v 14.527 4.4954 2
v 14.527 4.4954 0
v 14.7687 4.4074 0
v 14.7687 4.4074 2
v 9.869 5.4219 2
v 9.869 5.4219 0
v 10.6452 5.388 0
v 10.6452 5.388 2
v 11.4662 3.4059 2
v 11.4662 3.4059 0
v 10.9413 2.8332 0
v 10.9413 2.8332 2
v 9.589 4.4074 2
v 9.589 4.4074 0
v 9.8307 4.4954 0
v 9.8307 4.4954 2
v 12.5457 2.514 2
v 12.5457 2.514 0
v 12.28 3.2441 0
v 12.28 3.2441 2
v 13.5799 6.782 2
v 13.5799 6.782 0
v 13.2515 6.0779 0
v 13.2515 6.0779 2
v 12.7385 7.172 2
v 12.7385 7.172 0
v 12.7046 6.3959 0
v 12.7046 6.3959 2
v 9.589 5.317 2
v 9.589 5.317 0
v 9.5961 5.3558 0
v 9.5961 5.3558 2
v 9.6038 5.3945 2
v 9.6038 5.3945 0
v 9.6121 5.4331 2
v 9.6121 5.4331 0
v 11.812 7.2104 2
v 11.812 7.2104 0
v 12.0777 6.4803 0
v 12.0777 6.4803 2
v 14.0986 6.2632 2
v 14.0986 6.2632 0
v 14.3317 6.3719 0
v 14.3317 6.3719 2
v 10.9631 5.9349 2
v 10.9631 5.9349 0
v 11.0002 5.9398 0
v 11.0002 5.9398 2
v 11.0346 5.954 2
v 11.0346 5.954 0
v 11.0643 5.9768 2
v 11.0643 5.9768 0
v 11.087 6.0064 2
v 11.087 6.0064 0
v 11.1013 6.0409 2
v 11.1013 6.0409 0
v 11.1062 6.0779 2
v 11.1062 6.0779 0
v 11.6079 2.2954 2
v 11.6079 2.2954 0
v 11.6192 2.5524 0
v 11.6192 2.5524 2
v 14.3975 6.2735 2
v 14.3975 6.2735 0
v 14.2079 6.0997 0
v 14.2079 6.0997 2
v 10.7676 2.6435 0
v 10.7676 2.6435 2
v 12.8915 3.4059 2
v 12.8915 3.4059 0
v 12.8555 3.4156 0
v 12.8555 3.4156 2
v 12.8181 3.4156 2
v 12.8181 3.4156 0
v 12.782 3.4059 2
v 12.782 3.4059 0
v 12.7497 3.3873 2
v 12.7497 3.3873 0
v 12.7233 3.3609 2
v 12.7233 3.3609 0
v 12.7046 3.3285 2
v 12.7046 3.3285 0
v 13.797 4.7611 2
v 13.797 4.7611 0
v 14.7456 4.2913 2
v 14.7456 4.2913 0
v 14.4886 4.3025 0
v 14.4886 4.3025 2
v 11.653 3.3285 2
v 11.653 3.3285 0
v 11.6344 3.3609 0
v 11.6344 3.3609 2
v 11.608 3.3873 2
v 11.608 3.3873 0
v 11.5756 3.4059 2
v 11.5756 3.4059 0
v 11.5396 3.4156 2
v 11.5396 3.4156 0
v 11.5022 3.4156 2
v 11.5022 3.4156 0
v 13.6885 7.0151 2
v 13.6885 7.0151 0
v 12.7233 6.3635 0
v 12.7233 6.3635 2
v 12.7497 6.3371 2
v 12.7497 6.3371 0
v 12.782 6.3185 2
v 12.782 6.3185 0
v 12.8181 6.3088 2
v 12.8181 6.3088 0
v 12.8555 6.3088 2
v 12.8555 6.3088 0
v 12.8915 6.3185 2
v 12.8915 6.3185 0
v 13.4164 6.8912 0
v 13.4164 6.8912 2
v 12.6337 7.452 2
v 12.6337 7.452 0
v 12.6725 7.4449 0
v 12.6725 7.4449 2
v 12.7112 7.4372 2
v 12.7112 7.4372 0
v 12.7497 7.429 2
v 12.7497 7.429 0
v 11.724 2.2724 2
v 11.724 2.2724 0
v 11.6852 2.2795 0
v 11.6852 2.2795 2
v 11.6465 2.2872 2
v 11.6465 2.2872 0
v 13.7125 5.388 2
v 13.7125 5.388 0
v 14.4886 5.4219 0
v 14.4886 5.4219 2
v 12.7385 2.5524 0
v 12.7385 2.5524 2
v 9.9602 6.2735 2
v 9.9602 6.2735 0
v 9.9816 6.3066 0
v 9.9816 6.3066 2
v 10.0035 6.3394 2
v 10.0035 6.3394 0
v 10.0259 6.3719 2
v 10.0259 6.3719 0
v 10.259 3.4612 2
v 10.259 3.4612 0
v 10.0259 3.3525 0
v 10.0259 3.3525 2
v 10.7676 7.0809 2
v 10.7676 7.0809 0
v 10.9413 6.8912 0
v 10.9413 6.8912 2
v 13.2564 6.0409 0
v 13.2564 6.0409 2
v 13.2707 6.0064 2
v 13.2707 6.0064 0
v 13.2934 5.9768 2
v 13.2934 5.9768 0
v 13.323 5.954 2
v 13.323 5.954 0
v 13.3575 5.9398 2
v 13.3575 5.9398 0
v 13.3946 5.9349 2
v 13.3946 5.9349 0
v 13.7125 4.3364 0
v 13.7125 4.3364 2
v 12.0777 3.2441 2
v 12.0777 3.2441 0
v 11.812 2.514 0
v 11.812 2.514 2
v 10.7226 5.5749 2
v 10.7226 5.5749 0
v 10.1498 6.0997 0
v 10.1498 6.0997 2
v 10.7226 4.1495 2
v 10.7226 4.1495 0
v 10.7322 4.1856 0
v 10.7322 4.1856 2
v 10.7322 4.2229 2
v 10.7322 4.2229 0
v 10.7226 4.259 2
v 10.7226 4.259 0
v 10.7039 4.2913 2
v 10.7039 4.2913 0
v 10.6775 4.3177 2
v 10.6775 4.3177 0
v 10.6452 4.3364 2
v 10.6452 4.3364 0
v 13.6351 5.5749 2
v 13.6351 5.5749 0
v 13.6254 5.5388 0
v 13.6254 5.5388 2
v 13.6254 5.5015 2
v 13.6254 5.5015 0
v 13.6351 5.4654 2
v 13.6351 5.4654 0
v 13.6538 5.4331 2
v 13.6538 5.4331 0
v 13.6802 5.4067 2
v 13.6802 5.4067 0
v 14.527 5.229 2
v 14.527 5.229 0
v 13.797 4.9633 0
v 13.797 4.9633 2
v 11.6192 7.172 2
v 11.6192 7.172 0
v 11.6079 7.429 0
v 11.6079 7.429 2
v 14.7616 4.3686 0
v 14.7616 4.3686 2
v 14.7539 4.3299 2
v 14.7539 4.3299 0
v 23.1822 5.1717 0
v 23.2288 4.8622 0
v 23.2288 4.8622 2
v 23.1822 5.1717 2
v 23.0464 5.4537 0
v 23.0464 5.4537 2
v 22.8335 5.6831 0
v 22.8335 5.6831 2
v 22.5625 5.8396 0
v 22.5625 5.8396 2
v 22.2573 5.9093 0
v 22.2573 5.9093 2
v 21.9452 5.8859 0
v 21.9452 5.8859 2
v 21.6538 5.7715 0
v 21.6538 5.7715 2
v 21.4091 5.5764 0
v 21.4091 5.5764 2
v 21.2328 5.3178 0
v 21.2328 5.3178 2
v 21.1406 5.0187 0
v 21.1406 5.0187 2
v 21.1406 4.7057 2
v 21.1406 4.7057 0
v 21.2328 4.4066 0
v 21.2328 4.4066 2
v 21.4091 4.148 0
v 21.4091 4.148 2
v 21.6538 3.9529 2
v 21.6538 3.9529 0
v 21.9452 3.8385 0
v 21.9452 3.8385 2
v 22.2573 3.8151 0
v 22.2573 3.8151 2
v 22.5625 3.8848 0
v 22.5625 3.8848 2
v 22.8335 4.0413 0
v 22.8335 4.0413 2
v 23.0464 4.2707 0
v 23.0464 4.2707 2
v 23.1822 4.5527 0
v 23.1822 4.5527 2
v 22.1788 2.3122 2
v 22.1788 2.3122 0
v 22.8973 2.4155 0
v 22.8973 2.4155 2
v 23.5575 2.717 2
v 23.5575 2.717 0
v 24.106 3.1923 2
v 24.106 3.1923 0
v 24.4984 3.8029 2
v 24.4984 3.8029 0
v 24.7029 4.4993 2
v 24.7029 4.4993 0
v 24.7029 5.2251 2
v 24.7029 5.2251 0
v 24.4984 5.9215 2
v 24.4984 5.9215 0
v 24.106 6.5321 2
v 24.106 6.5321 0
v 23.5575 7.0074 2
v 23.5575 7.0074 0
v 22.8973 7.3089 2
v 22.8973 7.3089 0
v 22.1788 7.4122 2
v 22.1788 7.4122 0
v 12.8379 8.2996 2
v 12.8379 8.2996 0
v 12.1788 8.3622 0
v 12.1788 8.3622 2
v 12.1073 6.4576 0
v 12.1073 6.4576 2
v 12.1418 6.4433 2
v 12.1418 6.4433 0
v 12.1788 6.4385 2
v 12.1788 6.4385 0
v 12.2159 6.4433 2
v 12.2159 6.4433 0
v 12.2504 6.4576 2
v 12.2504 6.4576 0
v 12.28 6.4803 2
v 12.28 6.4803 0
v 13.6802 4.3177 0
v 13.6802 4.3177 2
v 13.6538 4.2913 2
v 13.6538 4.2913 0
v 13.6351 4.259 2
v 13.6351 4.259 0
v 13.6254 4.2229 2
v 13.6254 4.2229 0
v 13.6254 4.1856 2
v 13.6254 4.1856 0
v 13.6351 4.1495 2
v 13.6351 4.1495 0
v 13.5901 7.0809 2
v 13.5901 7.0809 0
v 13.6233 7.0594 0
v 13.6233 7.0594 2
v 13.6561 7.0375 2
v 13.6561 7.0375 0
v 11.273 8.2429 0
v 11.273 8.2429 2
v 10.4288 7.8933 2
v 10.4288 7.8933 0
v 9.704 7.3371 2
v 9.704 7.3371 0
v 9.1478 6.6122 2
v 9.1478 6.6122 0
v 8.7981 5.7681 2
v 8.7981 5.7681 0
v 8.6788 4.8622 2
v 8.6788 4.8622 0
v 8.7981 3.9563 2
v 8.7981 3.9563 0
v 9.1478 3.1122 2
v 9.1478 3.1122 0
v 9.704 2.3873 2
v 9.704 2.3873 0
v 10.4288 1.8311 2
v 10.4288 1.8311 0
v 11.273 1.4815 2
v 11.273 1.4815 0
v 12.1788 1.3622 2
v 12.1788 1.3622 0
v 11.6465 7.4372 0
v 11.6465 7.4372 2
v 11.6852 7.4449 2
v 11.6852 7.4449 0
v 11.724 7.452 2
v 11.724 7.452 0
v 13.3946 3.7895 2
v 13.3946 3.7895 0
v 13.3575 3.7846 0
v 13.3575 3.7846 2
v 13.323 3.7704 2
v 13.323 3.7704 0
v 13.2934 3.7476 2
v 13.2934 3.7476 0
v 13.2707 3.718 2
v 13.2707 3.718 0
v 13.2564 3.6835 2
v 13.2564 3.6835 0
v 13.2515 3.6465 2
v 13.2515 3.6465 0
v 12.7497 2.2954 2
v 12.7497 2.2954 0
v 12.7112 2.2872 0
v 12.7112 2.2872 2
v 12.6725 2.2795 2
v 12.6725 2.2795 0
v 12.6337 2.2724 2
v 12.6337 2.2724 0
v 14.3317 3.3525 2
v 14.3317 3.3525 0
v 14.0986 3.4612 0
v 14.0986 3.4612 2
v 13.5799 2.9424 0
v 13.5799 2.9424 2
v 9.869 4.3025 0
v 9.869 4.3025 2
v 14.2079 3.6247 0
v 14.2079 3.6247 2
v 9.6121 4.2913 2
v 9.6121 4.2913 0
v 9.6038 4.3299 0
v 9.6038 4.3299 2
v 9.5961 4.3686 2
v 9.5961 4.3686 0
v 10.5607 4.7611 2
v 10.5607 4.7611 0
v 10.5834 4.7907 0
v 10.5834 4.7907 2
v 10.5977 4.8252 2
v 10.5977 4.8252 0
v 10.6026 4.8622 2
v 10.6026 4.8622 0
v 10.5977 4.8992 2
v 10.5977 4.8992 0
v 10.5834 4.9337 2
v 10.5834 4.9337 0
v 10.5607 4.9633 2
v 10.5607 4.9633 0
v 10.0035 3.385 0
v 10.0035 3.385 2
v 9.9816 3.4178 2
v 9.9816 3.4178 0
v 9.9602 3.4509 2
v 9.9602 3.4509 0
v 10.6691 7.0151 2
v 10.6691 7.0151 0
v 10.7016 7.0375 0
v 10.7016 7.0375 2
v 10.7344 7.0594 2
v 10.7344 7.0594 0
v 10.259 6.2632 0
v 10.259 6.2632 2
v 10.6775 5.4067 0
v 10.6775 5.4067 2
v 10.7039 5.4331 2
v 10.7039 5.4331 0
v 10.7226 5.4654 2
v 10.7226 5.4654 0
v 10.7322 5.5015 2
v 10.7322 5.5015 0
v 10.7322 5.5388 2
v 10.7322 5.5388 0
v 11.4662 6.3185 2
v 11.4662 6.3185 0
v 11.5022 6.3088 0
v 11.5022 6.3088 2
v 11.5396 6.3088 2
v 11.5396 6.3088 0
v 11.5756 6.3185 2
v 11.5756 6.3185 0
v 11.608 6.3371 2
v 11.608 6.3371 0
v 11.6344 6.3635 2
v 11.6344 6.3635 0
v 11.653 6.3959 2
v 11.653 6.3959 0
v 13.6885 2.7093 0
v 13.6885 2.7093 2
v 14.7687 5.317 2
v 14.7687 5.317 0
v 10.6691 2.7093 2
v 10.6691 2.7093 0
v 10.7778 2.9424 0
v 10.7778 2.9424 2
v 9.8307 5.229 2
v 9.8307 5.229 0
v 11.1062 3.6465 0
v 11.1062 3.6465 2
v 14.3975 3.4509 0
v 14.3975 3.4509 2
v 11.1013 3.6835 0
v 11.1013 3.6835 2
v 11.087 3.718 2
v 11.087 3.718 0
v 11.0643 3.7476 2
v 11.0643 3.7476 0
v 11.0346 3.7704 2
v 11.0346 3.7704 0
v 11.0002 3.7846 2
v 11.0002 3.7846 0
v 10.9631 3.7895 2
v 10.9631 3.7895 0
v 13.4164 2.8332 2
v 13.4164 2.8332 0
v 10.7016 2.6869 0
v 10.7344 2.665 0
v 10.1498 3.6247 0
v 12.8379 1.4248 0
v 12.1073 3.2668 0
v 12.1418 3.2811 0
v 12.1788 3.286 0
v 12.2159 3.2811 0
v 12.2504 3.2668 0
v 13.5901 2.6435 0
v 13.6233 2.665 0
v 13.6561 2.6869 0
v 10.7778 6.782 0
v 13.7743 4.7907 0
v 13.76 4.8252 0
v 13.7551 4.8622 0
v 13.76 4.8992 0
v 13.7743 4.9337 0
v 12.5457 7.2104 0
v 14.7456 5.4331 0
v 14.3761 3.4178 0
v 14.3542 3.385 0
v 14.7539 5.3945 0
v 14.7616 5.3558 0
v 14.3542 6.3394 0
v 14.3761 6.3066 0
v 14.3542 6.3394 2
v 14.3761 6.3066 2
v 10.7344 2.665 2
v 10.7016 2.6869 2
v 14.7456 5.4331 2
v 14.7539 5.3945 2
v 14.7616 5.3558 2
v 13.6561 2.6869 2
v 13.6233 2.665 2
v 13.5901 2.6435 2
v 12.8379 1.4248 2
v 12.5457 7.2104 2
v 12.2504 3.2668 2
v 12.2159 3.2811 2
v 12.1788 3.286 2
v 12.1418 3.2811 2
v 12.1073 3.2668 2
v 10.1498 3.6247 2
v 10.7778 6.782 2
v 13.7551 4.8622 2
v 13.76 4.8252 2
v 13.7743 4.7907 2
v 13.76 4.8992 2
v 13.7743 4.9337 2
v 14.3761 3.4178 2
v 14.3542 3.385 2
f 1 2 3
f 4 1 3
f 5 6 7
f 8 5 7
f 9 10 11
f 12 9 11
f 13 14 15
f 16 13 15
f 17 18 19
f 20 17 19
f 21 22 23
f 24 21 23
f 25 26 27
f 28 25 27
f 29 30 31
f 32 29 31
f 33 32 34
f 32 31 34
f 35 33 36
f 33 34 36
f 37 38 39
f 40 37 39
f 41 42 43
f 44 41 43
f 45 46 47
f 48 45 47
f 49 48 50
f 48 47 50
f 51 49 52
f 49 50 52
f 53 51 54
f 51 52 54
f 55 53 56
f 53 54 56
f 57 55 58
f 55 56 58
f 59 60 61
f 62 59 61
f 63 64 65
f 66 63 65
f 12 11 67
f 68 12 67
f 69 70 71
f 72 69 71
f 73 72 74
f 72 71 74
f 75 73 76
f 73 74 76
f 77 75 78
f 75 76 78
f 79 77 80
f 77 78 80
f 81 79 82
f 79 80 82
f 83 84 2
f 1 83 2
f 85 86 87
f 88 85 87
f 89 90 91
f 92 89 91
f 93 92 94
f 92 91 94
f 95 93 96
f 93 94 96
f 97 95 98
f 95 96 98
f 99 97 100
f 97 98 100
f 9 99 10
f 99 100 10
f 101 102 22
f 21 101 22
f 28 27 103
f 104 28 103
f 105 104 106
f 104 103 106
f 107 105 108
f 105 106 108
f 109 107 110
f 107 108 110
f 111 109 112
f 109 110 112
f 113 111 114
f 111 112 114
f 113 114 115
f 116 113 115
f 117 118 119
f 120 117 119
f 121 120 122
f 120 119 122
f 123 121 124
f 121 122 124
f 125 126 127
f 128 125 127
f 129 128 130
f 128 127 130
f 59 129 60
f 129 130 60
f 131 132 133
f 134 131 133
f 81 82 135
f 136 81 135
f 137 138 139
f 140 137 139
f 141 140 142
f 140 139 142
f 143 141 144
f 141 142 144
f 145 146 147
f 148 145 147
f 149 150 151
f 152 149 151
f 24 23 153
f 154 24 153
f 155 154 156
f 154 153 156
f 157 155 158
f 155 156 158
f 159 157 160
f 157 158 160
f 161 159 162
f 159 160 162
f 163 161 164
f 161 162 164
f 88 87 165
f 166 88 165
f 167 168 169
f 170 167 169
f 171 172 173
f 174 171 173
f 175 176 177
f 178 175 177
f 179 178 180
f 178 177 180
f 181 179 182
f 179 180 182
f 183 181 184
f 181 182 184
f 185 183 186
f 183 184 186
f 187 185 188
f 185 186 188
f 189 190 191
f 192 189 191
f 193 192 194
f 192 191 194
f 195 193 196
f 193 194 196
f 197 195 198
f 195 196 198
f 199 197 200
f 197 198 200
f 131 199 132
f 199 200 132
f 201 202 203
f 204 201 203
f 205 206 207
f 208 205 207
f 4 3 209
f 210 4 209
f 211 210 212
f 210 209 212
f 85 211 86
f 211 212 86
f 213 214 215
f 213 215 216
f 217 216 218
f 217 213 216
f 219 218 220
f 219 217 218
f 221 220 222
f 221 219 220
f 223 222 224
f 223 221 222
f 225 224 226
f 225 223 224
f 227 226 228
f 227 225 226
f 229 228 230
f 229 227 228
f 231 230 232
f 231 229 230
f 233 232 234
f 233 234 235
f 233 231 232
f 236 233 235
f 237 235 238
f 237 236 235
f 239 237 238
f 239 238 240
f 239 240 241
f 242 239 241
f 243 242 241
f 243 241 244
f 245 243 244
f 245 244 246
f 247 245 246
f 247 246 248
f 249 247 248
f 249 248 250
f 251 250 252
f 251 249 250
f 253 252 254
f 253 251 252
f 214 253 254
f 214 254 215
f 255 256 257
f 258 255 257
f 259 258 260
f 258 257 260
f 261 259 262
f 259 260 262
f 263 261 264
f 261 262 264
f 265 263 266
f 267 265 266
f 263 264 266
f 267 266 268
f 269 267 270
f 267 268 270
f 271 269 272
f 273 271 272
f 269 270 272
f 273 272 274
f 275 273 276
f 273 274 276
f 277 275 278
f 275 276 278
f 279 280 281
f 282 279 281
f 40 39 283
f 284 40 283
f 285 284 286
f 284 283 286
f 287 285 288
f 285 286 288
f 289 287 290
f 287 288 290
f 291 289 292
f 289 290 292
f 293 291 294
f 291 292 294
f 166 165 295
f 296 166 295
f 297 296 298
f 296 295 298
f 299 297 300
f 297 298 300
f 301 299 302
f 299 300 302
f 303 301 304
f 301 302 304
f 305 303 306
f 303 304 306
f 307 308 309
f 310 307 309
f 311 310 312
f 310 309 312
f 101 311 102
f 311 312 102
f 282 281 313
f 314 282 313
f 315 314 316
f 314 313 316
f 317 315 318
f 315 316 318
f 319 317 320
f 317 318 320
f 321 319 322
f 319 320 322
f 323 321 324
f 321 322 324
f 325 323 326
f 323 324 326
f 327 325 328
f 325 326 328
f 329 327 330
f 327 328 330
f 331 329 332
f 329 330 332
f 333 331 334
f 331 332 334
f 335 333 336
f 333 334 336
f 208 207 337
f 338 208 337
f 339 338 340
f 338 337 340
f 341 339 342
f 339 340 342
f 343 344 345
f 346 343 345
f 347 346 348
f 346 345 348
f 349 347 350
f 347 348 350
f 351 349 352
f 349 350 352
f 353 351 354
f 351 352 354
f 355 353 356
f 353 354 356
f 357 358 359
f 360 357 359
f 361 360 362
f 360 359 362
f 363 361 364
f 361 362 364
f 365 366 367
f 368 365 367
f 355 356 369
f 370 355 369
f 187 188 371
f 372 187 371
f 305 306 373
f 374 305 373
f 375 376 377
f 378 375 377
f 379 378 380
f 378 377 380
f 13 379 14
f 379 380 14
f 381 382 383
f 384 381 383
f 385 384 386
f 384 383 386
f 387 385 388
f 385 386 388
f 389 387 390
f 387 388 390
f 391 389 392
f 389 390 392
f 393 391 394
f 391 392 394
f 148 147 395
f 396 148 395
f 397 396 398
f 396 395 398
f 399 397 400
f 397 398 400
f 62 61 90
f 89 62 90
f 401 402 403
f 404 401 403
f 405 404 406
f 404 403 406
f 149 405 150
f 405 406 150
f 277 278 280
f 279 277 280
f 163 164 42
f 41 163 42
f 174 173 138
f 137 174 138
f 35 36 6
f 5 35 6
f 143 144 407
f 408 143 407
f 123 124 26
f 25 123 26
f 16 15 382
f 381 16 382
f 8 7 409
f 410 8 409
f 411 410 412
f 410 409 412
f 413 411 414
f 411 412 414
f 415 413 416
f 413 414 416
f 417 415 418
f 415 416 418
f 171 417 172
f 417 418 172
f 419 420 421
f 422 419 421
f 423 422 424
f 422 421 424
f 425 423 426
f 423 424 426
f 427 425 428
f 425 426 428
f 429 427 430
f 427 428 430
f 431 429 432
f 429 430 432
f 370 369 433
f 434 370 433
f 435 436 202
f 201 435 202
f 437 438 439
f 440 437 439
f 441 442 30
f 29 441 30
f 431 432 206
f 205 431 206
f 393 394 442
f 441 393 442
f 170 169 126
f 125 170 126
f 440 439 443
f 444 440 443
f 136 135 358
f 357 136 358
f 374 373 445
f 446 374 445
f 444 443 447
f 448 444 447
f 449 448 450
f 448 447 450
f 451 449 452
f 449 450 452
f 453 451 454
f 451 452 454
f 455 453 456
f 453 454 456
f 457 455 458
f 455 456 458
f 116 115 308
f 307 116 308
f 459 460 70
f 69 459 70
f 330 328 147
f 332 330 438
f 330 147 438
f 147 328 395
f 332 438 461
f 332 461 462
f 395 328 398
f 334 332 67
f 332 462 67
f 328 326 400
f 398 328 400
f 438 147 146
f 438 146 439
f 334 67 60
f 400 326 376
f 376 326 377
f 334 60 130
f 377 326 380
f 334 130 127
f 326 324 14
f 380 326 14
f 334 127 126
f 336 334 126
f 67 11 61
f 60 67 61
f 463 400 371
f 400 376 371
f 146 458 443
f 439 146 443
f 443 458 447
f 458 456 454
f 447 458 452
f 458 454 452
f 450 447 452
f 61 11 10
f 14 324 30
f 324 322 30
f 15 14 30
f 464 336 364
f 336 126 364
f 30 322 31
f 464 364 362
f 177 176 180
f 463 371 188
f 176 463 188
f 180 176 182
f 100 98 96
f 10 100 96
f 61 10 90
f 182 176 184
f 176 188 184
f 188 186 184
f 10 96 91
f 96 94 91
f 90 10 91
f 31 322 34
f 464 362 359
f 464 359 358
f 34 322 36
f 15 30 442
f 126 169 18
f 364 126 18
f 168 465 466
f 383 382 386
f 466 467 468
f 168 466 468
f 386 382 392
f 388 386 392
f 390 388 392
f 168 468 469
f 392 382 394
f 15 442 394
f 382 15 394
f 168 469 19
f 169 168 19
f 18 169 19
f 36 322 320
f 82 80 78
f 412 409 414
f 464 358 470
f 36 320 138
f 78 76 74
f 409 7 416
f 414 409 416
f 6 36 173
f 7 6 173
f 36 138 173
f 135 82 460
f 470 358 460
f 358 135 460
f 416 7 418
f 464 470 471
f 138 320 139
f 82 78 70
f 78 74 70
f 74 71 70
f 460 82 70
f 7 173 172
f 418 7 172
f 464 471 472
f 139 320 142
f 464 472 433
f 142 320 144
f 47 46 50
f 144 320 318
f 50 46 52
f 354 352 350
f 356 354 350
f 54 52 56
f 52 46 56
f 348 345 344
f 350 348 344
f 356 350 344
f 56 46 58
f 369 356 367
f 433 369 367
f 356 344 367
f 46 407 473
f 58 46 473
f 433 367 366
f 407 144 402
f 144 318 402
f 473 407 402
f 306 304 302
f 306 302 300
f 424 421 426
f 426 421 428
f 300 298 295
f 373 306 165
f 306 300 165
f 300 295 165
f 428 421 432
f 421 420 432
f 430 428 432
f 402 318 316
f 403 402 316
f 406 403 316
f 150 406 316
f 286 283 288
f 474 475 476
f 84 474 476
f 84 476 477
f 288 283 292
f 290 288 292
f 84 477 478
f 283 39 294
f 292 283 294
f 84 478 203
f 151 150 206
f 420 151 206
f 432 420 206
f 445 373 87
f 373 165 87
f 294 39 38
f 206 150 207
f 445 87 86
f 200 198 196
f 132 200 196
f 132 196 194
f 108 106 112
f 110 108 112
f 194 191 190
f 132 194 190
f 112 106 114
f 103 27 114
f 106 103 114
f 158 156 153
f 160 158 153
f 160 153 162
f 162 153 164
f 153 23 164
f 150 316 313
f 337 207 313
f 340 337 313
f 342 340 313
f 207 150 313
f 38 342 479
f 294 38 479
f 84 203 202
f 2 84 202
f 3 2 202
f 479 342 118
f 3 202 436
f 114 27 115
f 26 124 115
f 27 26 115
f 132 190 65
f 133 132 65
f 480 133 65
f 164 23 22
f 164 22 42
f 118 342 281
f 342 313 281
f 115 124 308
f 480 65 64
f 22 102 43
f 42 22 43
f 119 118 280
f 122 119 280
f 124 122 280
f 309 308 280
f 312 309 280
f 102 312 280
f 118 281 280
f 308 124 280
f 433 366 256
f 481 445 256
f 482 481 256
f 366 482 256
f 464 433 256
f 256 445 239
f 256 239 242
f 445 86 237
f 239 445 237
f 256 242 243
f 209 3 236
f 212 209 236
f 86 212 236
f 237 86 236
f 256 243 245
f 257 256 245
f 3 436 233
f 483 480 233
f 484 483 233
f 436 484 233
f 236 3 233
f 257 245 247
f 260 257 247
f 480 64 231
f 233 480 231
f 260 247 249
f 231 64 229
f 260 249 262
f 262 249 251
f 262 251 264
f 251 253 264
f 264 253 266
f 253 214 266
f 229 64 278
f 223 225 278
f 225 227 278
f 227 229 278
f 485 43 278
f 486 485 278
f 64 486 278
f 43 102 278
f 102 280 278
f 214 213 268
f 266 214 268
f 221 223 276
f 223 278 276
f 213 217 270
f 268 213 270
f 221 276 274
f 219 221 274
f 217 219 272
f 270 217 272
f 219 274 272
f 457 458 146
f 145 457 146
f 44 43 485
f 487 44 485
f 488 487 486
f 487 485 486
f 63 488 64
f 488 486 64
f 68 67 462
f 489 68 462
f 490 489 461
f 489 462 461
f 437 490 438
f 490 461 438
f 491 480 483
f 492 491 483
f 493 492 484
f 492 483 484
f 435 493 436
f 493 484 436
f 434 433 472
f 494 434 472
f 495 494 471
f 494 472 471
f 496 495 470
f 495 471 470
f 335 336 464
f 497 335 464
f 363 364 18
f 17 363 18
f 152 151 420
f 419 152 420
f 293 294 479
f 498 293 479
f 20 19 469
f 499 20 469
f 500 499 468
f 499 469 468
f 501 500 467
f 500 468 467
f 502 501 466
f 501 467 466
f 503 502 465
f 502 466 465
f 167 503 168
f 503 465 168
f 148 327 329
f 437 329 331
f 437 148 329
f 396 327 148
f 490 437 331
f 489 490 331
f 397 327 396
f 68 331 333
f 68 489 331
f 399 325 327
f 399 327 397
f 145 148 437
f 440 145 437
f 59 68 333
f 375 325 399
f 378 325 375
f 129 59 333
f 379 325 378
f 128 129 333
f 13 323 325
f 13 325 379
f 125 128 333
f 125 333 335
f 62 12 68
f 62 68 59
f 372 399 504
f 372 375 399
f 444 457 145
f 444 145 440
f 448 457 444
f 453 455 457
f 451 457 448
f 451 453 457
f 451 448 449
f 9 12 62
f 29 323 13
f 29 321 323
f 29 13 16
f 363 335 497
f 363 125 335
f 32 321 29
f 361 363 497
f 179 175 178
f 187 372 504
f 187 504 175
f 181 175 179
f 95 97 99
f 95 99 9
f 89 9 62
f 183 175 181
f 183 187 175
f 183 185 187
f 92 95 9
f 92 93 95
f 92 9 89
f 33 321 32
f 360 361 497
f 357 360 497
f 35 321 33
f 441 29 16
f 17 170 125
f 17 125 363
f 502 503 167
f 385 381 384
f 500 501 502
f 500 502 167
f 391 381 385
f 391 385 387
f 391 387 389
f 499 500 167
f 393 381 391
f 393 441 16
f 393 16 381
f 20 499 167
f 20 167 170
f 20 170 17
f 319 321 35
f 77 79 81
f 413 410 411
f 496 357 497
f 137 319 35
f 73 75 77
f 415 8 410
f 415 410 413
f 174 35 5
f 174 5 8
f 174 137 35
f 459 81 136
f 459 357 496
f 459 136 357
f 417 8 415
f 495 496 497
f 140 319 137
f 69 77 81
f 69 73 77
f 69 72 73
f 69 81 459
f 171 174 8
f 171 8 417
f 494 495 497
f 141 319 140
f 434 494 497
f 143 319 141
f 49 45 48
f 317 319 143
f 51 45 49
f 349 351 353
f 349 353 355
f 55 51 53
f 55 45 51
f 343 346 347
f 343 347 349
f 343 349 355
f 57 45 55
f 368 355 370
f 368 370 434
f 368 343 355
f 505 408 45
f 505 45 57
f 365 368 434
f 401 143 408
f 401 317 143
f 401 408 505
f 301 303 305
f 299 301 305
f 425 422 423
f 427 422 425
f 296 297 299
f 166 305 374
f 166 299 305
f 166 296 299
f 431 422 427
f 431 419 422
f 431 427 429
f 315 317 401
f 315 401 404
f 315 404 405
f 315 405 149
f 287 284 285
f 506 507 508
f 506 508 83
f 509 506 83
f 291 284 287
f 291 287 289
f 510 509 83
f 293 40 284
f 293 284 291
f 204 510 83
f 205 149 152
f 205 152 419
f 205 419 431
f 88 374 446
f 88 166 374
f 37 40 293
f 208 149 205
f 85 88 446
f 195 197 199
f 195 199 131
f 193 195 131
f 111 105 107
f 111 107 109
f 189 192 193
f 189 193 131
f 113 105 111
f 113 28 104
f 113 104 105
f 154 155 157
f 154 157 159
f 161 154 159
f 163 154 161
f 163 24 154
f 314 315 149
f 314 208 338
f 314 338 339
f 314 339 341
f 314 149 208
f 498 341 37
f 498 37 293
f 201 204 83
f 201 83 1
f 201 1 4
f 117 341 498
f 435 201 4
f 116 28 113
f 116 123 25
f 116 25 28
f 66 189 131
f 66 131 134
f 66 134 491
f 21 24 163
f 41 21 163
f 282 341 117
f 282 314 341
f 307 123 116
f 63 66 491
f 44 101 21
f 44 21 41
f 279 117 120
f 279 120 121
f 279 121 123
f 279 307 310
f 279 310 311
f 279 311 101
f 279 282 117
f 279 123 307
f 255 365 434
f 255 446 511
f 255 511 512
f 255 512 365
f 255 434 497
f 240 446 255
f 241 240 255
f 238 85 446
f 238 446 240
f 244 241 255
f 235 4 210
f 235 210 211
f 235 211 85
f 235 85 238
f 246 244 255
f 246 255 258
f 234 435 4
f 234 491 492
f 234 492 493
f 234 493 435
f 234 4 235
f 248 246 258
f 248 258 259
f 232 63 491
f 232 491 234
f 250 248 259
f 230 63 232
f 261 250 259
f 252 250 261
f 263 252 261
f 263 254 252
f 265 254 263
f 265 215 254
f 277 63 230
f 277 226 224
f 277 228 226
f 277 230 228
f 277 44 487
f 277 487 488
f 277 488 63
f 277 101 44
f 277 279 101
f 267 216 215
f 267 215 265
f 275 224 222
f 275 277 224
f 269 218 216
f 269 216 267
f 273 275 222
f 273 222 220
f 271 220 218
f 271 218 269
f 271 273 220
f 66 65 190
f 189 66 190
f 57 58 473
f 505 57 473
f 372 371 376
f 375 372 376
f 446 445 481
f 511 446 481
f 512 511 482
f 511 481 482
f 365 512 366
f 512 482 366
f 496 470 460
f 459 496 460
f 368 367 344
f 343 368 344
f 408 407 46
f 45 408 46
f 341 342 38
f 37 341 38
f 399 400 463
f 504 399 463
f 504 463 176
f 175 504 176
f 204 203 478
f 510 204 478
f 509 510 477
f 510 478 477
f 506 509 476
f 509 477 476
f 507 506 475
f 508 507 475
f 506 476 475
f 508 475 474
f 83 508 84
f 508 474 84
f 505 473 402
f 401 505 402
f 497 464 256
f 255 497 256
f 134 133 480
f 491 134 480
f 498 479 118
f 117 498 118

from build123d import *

# Parameters (mm, degrees)
SKETCH1_R           = 1.05
BOSS_EXTRUDE3_DEPTH = 2


with BuildPart() as part:
    # Sketch1 → Boss-Extrude3 (new body)
    with BuildSketch(Plane.XY):
        with BuildLine():
            Line((12.837896157, 8.299592267), (12.178844101, 8.362202212))
            ThreePointArc((12.178844101, 8.362202212), (8.678844101, 4.862202212), (12.178844101, 1.362202212))
            Line((12.178844101, 1.362202212), (12.837896157, 1.424812158))
            Line((12.837896157, 1.424812158), (22.178844101, 2.312202212))
            ThreePointArc((22.178844101, 2.312202212), (24.728844101, 4.862202212), (22.178844101, 7.412202212))
            Line((22.178844101, 7.412202212), (12.837896157, 8.299592267))
        make_face()
        with BuildLine():
            Line((11.619157127, 2.552399344), (11.653043843, 3.328532726))
            ThreePointArc((11.653043843, 3.328532726), (11.575639379, 3.40593719), (11.466172936, 3.40593719))
            Line((11.466172936, 3.40593719), (10.941325284, 2.833166486))
            Line((10.941325284, 2.833166486), (10.767566215, 2.643541736))
            ThreePointArc((10.767566215, 2.643541736), (10.717983865, 2.675870364), (10.669141763, 2.709306852))
            Line((10.669141763, 2.709306852), (10.777837472, 2.94240555))
            Line((10.777837472, 2.94240555), (11.106158101, 3.646491412))
            ThreePointArc((11.106158101, 3.646491412), (11.064267107, 3.747625218), (10.963133301, 3.789516212))
            Line((10.963133301, 3.789516212), (10.259047439, 3.461195582))
            Line((10.259047439, 3.461195582), (10.025948741, 3.352499874))
            ThreePointArc((10.025948741, 3.352499874), (9.992512253, 3.401341976), (9.960183625, 3.450924326))
            Line((9.960183625, 3.450924326), (10.149808375, 3.624683395))
            Line((10.149808375, 3.624683395), (10.722579079, 4.149531047))
            ThreePointArc((10.722579079, 4.149531047), (10.722579079, 4.258997489), (10.645174615, 4.336401953))
            Line((10.645174615, 4.336401953), (9.869041233, 4.302515238))
            Line((9.869041233, 4.302515238), (9.61209007, 4.291296508))
            ThreePointArc((9.61209007, 4.291296508), (9.599889846, 4.349216316), (9.588996432, 4.407396064))
            Line((9.588996432, 4.407396064), (9.830681575, 4.495362262))
            Line((9.830681575, 4.495362262), (10.560703205, 4.761068406))
            ThreePointArc((10.560703205, 4.761068406), (10.602594199, 4.862202212), (10.560703205, 4.963336018))
            Line((10.560703205, 4.963336018), (9.830681575, 5.229042162))
            Line((9.830681575, 5.229042162), (9.588996432, 5.31700836))
            ThreePointArc((9.588996432, 5.31700836), (9.599889846, 5.375188109), (9.61209007, 5.433107916))
            Line((9.61209007, 5.433107916), (9.869041233, 5.421889186))
            Line((9.869041233, 5.421889186), (10.645174615, 5.388002471))
            ThreePointArc((10.645174615, 5.388002471), (10.722579079, 5.465406935), (10.722579079, 5.574873378))
            Line((10.722579079, 5.574873378), (10.149808375, 6.099721029))
            Line((10.149808375, 6.099721029), (9.960183625, 6.273480099))
            ThreePointArc((9.960183625, 6.273480099), (9.992512253, 6.323062449), (10.025948741, 6.37190455))
            Line((10.025948741, 6.37190455), (10.259047439, 6.263208842))
            Line((10.259047439, 6.263208842), (10.963133301, 5.934888213))
            ThreePointArc((10.963133301, 5.934888213), (11.064267107, 5.976779207), (11.106158101, 6.077913013))
            Line((11.106158101, 6.077913013), (10.777837472, 6.781998874))
            Line((10.777837472, 6.781998874), (10.669141763, 7.015097573))
            ThreePointArc((10.669141763, 7.015097573), (10.717983865, 7.048534061), (10.767566215, 7.080862689))
            Line((10.767566215, 7.080862689), (10.941325284, 6.891237939))
            Line((10.941325284, 6.891237939), (11.466172936, 6.318467235))
            ThreePointArc((11.466172936, 6.318467235), (11.575639379, 6.318467235), (11.653043843, 6.395871699))
            Line((11.653043843, 6.395871699), (11.619157127, 7.172005081))
            Line((11.619157127, 7.172005081), (11.607938397, 7.428956244))
            ThreePointArc((11.607938397, 7.428956244), (11.665858205, 7.441156468), (11.724037954, 7.452049882))
            Line((11.724037954, 7.452049882), (11.812004151, 7.210364739))
            Line((11.812004151, 7.210364739), (12.077710295, 6.480343109))
            ThreePointArc((12.077710295, 6.480343109), (12.178844101, 6.438452114), (12.279977907, 6.480343109))
            Line((12.279977907, 6.480343109), (12.545684051, 7.210364739))
            Line((12.545684051, 7.210364739), (12.633650249, 7.452049882))
            ThreePointArc((12.633650249, 7.452049882), (12.691829998, 7.441156468), (12.749749805, 7.428956244))
            Line((12.749749805, 7.428956244), (12.738531075, 7.172005081))
            Line((12.738531075, 7.172005081), (12.70464436, 6.395871699))
            ThreePointArc((12.70464436, 6.395871699), (12.782048824, 6.318467235), (12.891515267, 6.318467235))
            Line((12.891515267, 6.318467235), (13.416362918, 6.891237939))
            Line((13.416362918, 6.891237939), (13.590121988, 7.080862689))
            ThreePointArc((13.590121988, 7.080862689), (13.639704338, 7.048534061), (13.688546439, 7.015097573))
            Line((13.688546439, 7.015097573), (13.579850731, 6.781998874))
            Line((13.579850731, 6.781998874), (13.251530102, 6.077913013))
            ThreePointArc((13.251530102, 6.077913013), (13.293421096, 5.976779207), (13.394554902, 5.934888213))
            Line((13.394554902, 5.934888213), (14.098640763, 6.263208842))
            Line((14.098640763, 6.263208842), (14.331739462, 6.37190455))
            ThreePointArc((14.331739462, 6.37190455), (14.36517595, 6.323062449), (14.397504578, 6.273480099))
            Line((14.397504578, 6.273480099), (14.207879828, 6.099721029))
            Line((14.207879828, 6.099721029), (13.635109124, 5.574873378))
            ThreePointArc((13.635109124, 5.574873378), (13.635109124, 5.465406935), (13.712513588, 5.388002471))
            Line((13.712513588, 5.388002471), (14.48864697, 5.421889186))
            Line((14.48864697, 5.421889186), (14.745598133, 5.433107916))
            ThreePointArc((14.745598133, 5.433107916), (14.757798357, 5.375188109), (14.768691771, 5.31700836))
            Line((14.768691771, 5.31700836), (14.527006628, 5.229042162))
            Line((14.527006628, 5.229042162), (13.796984998, 4.963336018))
            ThreePointArc((13.796984998, 4.963336018), (13.755094004, 4.862202212), (13.796984998, 4.761068406))
            Line((13.796984998, 4.761068406), (14.527006628, 4.495362262))
            Line((14.527006628, 4.495362262), (14.768691771, 4.407396064))
            ThreePointArc((14.768691771, 4.407396064), (14.757798357, 4.349216316), (14.745598133, 4.291296508))
            Line((14.745598133, 4.291296508), (14.48864697, 4.302515238))
            Line((14.48864697, 4.302515238), (13.712513588, 4.336401953))
            ThreePointArc((13.712513588, 4.336401953), (13.635109124, 4.258997489), (13.635109124, 4.149531047))
            Line((13.635109124, 4.149531047), (14.207879828, 3.624683395))
            Line((14.207879828, 3.624683395), (14.397504578, 3.450924326))
            ThreePointArc((14.397504578, 3.450924326), (14.36517595, 3.401341976), (14.331739462, 3.352499874))
            Line((14.331739462, 3.352499874), (14.098640763, 3.461195582))
            Line((14.098640763, 3.461195582), (13.394554902, 3.789516212))
            ThreePointArc((13.394554902, 3.789516212), (13.293421096, 3.747625218), (13.251530102, 3.646491412))
            Line((13.251530102, 3.646491412), (13.579850731, 2.94240555))
            Line((13.579850731, 2.94240555), (13.688546439, 2.709306852))
            ThreePointArc((13.688546439, 2.709306852), (13.639704338, 2.675870364), (13.590121988, 2.643541736))
            Line((13.590121988, 2.643541736), (13.416362918, 2.833166486))
            Line((13.416362918, 2.833166486), (12.891515267, 3.40593719))
            ThreePointArc((12.891515267, 3.40593719), (12.782048824, 3.40593719), (12.70464436, 3.328532726))
            Line((12.70464436, 3.328532726), (12.738531075, 2.552399344))
            Line((12.738531075, 2.552399344), (12.749749805, 2.295448181))
            ThreePointArc((12.749749805, 2.295448181), (12.691829998, 2.283247957), (12.633650249, 2.272354543))
            Line((12.633650249, 2.272354543), (12.545684051, 2.514039686))
            Line((12.545684051, 2.514039686), (12.279977907, 3.244061316))
            ThreePointArc((12.279977907, 3.244061316), (12.178844101, 3.28595231), (12.077710295, 3.244061316))
            Line((12.077710295, 3.244061316), (11.812004151, 2.514039686))
            Line((11.812004151, 2.514039686), (11.724037954, 2.272354543))
            ThreePointArc((11.724037954, 2.272354543), (11.665858205, 2.283247957), (11.607938397, 2.295448181))
            Line((11.607938397, 2.295448181), (11.619157127, 2.552399344))
        make_face(mode=Mode.SUBTRACT)
        with Locations((22.178844101, 4.862202212)):
            Circle(SKETCH1_R, mode=Mode.SUBTRACT)
    extrude(amount=BOSS_EXTRUDE3_DEPTH)


solid = part.part
